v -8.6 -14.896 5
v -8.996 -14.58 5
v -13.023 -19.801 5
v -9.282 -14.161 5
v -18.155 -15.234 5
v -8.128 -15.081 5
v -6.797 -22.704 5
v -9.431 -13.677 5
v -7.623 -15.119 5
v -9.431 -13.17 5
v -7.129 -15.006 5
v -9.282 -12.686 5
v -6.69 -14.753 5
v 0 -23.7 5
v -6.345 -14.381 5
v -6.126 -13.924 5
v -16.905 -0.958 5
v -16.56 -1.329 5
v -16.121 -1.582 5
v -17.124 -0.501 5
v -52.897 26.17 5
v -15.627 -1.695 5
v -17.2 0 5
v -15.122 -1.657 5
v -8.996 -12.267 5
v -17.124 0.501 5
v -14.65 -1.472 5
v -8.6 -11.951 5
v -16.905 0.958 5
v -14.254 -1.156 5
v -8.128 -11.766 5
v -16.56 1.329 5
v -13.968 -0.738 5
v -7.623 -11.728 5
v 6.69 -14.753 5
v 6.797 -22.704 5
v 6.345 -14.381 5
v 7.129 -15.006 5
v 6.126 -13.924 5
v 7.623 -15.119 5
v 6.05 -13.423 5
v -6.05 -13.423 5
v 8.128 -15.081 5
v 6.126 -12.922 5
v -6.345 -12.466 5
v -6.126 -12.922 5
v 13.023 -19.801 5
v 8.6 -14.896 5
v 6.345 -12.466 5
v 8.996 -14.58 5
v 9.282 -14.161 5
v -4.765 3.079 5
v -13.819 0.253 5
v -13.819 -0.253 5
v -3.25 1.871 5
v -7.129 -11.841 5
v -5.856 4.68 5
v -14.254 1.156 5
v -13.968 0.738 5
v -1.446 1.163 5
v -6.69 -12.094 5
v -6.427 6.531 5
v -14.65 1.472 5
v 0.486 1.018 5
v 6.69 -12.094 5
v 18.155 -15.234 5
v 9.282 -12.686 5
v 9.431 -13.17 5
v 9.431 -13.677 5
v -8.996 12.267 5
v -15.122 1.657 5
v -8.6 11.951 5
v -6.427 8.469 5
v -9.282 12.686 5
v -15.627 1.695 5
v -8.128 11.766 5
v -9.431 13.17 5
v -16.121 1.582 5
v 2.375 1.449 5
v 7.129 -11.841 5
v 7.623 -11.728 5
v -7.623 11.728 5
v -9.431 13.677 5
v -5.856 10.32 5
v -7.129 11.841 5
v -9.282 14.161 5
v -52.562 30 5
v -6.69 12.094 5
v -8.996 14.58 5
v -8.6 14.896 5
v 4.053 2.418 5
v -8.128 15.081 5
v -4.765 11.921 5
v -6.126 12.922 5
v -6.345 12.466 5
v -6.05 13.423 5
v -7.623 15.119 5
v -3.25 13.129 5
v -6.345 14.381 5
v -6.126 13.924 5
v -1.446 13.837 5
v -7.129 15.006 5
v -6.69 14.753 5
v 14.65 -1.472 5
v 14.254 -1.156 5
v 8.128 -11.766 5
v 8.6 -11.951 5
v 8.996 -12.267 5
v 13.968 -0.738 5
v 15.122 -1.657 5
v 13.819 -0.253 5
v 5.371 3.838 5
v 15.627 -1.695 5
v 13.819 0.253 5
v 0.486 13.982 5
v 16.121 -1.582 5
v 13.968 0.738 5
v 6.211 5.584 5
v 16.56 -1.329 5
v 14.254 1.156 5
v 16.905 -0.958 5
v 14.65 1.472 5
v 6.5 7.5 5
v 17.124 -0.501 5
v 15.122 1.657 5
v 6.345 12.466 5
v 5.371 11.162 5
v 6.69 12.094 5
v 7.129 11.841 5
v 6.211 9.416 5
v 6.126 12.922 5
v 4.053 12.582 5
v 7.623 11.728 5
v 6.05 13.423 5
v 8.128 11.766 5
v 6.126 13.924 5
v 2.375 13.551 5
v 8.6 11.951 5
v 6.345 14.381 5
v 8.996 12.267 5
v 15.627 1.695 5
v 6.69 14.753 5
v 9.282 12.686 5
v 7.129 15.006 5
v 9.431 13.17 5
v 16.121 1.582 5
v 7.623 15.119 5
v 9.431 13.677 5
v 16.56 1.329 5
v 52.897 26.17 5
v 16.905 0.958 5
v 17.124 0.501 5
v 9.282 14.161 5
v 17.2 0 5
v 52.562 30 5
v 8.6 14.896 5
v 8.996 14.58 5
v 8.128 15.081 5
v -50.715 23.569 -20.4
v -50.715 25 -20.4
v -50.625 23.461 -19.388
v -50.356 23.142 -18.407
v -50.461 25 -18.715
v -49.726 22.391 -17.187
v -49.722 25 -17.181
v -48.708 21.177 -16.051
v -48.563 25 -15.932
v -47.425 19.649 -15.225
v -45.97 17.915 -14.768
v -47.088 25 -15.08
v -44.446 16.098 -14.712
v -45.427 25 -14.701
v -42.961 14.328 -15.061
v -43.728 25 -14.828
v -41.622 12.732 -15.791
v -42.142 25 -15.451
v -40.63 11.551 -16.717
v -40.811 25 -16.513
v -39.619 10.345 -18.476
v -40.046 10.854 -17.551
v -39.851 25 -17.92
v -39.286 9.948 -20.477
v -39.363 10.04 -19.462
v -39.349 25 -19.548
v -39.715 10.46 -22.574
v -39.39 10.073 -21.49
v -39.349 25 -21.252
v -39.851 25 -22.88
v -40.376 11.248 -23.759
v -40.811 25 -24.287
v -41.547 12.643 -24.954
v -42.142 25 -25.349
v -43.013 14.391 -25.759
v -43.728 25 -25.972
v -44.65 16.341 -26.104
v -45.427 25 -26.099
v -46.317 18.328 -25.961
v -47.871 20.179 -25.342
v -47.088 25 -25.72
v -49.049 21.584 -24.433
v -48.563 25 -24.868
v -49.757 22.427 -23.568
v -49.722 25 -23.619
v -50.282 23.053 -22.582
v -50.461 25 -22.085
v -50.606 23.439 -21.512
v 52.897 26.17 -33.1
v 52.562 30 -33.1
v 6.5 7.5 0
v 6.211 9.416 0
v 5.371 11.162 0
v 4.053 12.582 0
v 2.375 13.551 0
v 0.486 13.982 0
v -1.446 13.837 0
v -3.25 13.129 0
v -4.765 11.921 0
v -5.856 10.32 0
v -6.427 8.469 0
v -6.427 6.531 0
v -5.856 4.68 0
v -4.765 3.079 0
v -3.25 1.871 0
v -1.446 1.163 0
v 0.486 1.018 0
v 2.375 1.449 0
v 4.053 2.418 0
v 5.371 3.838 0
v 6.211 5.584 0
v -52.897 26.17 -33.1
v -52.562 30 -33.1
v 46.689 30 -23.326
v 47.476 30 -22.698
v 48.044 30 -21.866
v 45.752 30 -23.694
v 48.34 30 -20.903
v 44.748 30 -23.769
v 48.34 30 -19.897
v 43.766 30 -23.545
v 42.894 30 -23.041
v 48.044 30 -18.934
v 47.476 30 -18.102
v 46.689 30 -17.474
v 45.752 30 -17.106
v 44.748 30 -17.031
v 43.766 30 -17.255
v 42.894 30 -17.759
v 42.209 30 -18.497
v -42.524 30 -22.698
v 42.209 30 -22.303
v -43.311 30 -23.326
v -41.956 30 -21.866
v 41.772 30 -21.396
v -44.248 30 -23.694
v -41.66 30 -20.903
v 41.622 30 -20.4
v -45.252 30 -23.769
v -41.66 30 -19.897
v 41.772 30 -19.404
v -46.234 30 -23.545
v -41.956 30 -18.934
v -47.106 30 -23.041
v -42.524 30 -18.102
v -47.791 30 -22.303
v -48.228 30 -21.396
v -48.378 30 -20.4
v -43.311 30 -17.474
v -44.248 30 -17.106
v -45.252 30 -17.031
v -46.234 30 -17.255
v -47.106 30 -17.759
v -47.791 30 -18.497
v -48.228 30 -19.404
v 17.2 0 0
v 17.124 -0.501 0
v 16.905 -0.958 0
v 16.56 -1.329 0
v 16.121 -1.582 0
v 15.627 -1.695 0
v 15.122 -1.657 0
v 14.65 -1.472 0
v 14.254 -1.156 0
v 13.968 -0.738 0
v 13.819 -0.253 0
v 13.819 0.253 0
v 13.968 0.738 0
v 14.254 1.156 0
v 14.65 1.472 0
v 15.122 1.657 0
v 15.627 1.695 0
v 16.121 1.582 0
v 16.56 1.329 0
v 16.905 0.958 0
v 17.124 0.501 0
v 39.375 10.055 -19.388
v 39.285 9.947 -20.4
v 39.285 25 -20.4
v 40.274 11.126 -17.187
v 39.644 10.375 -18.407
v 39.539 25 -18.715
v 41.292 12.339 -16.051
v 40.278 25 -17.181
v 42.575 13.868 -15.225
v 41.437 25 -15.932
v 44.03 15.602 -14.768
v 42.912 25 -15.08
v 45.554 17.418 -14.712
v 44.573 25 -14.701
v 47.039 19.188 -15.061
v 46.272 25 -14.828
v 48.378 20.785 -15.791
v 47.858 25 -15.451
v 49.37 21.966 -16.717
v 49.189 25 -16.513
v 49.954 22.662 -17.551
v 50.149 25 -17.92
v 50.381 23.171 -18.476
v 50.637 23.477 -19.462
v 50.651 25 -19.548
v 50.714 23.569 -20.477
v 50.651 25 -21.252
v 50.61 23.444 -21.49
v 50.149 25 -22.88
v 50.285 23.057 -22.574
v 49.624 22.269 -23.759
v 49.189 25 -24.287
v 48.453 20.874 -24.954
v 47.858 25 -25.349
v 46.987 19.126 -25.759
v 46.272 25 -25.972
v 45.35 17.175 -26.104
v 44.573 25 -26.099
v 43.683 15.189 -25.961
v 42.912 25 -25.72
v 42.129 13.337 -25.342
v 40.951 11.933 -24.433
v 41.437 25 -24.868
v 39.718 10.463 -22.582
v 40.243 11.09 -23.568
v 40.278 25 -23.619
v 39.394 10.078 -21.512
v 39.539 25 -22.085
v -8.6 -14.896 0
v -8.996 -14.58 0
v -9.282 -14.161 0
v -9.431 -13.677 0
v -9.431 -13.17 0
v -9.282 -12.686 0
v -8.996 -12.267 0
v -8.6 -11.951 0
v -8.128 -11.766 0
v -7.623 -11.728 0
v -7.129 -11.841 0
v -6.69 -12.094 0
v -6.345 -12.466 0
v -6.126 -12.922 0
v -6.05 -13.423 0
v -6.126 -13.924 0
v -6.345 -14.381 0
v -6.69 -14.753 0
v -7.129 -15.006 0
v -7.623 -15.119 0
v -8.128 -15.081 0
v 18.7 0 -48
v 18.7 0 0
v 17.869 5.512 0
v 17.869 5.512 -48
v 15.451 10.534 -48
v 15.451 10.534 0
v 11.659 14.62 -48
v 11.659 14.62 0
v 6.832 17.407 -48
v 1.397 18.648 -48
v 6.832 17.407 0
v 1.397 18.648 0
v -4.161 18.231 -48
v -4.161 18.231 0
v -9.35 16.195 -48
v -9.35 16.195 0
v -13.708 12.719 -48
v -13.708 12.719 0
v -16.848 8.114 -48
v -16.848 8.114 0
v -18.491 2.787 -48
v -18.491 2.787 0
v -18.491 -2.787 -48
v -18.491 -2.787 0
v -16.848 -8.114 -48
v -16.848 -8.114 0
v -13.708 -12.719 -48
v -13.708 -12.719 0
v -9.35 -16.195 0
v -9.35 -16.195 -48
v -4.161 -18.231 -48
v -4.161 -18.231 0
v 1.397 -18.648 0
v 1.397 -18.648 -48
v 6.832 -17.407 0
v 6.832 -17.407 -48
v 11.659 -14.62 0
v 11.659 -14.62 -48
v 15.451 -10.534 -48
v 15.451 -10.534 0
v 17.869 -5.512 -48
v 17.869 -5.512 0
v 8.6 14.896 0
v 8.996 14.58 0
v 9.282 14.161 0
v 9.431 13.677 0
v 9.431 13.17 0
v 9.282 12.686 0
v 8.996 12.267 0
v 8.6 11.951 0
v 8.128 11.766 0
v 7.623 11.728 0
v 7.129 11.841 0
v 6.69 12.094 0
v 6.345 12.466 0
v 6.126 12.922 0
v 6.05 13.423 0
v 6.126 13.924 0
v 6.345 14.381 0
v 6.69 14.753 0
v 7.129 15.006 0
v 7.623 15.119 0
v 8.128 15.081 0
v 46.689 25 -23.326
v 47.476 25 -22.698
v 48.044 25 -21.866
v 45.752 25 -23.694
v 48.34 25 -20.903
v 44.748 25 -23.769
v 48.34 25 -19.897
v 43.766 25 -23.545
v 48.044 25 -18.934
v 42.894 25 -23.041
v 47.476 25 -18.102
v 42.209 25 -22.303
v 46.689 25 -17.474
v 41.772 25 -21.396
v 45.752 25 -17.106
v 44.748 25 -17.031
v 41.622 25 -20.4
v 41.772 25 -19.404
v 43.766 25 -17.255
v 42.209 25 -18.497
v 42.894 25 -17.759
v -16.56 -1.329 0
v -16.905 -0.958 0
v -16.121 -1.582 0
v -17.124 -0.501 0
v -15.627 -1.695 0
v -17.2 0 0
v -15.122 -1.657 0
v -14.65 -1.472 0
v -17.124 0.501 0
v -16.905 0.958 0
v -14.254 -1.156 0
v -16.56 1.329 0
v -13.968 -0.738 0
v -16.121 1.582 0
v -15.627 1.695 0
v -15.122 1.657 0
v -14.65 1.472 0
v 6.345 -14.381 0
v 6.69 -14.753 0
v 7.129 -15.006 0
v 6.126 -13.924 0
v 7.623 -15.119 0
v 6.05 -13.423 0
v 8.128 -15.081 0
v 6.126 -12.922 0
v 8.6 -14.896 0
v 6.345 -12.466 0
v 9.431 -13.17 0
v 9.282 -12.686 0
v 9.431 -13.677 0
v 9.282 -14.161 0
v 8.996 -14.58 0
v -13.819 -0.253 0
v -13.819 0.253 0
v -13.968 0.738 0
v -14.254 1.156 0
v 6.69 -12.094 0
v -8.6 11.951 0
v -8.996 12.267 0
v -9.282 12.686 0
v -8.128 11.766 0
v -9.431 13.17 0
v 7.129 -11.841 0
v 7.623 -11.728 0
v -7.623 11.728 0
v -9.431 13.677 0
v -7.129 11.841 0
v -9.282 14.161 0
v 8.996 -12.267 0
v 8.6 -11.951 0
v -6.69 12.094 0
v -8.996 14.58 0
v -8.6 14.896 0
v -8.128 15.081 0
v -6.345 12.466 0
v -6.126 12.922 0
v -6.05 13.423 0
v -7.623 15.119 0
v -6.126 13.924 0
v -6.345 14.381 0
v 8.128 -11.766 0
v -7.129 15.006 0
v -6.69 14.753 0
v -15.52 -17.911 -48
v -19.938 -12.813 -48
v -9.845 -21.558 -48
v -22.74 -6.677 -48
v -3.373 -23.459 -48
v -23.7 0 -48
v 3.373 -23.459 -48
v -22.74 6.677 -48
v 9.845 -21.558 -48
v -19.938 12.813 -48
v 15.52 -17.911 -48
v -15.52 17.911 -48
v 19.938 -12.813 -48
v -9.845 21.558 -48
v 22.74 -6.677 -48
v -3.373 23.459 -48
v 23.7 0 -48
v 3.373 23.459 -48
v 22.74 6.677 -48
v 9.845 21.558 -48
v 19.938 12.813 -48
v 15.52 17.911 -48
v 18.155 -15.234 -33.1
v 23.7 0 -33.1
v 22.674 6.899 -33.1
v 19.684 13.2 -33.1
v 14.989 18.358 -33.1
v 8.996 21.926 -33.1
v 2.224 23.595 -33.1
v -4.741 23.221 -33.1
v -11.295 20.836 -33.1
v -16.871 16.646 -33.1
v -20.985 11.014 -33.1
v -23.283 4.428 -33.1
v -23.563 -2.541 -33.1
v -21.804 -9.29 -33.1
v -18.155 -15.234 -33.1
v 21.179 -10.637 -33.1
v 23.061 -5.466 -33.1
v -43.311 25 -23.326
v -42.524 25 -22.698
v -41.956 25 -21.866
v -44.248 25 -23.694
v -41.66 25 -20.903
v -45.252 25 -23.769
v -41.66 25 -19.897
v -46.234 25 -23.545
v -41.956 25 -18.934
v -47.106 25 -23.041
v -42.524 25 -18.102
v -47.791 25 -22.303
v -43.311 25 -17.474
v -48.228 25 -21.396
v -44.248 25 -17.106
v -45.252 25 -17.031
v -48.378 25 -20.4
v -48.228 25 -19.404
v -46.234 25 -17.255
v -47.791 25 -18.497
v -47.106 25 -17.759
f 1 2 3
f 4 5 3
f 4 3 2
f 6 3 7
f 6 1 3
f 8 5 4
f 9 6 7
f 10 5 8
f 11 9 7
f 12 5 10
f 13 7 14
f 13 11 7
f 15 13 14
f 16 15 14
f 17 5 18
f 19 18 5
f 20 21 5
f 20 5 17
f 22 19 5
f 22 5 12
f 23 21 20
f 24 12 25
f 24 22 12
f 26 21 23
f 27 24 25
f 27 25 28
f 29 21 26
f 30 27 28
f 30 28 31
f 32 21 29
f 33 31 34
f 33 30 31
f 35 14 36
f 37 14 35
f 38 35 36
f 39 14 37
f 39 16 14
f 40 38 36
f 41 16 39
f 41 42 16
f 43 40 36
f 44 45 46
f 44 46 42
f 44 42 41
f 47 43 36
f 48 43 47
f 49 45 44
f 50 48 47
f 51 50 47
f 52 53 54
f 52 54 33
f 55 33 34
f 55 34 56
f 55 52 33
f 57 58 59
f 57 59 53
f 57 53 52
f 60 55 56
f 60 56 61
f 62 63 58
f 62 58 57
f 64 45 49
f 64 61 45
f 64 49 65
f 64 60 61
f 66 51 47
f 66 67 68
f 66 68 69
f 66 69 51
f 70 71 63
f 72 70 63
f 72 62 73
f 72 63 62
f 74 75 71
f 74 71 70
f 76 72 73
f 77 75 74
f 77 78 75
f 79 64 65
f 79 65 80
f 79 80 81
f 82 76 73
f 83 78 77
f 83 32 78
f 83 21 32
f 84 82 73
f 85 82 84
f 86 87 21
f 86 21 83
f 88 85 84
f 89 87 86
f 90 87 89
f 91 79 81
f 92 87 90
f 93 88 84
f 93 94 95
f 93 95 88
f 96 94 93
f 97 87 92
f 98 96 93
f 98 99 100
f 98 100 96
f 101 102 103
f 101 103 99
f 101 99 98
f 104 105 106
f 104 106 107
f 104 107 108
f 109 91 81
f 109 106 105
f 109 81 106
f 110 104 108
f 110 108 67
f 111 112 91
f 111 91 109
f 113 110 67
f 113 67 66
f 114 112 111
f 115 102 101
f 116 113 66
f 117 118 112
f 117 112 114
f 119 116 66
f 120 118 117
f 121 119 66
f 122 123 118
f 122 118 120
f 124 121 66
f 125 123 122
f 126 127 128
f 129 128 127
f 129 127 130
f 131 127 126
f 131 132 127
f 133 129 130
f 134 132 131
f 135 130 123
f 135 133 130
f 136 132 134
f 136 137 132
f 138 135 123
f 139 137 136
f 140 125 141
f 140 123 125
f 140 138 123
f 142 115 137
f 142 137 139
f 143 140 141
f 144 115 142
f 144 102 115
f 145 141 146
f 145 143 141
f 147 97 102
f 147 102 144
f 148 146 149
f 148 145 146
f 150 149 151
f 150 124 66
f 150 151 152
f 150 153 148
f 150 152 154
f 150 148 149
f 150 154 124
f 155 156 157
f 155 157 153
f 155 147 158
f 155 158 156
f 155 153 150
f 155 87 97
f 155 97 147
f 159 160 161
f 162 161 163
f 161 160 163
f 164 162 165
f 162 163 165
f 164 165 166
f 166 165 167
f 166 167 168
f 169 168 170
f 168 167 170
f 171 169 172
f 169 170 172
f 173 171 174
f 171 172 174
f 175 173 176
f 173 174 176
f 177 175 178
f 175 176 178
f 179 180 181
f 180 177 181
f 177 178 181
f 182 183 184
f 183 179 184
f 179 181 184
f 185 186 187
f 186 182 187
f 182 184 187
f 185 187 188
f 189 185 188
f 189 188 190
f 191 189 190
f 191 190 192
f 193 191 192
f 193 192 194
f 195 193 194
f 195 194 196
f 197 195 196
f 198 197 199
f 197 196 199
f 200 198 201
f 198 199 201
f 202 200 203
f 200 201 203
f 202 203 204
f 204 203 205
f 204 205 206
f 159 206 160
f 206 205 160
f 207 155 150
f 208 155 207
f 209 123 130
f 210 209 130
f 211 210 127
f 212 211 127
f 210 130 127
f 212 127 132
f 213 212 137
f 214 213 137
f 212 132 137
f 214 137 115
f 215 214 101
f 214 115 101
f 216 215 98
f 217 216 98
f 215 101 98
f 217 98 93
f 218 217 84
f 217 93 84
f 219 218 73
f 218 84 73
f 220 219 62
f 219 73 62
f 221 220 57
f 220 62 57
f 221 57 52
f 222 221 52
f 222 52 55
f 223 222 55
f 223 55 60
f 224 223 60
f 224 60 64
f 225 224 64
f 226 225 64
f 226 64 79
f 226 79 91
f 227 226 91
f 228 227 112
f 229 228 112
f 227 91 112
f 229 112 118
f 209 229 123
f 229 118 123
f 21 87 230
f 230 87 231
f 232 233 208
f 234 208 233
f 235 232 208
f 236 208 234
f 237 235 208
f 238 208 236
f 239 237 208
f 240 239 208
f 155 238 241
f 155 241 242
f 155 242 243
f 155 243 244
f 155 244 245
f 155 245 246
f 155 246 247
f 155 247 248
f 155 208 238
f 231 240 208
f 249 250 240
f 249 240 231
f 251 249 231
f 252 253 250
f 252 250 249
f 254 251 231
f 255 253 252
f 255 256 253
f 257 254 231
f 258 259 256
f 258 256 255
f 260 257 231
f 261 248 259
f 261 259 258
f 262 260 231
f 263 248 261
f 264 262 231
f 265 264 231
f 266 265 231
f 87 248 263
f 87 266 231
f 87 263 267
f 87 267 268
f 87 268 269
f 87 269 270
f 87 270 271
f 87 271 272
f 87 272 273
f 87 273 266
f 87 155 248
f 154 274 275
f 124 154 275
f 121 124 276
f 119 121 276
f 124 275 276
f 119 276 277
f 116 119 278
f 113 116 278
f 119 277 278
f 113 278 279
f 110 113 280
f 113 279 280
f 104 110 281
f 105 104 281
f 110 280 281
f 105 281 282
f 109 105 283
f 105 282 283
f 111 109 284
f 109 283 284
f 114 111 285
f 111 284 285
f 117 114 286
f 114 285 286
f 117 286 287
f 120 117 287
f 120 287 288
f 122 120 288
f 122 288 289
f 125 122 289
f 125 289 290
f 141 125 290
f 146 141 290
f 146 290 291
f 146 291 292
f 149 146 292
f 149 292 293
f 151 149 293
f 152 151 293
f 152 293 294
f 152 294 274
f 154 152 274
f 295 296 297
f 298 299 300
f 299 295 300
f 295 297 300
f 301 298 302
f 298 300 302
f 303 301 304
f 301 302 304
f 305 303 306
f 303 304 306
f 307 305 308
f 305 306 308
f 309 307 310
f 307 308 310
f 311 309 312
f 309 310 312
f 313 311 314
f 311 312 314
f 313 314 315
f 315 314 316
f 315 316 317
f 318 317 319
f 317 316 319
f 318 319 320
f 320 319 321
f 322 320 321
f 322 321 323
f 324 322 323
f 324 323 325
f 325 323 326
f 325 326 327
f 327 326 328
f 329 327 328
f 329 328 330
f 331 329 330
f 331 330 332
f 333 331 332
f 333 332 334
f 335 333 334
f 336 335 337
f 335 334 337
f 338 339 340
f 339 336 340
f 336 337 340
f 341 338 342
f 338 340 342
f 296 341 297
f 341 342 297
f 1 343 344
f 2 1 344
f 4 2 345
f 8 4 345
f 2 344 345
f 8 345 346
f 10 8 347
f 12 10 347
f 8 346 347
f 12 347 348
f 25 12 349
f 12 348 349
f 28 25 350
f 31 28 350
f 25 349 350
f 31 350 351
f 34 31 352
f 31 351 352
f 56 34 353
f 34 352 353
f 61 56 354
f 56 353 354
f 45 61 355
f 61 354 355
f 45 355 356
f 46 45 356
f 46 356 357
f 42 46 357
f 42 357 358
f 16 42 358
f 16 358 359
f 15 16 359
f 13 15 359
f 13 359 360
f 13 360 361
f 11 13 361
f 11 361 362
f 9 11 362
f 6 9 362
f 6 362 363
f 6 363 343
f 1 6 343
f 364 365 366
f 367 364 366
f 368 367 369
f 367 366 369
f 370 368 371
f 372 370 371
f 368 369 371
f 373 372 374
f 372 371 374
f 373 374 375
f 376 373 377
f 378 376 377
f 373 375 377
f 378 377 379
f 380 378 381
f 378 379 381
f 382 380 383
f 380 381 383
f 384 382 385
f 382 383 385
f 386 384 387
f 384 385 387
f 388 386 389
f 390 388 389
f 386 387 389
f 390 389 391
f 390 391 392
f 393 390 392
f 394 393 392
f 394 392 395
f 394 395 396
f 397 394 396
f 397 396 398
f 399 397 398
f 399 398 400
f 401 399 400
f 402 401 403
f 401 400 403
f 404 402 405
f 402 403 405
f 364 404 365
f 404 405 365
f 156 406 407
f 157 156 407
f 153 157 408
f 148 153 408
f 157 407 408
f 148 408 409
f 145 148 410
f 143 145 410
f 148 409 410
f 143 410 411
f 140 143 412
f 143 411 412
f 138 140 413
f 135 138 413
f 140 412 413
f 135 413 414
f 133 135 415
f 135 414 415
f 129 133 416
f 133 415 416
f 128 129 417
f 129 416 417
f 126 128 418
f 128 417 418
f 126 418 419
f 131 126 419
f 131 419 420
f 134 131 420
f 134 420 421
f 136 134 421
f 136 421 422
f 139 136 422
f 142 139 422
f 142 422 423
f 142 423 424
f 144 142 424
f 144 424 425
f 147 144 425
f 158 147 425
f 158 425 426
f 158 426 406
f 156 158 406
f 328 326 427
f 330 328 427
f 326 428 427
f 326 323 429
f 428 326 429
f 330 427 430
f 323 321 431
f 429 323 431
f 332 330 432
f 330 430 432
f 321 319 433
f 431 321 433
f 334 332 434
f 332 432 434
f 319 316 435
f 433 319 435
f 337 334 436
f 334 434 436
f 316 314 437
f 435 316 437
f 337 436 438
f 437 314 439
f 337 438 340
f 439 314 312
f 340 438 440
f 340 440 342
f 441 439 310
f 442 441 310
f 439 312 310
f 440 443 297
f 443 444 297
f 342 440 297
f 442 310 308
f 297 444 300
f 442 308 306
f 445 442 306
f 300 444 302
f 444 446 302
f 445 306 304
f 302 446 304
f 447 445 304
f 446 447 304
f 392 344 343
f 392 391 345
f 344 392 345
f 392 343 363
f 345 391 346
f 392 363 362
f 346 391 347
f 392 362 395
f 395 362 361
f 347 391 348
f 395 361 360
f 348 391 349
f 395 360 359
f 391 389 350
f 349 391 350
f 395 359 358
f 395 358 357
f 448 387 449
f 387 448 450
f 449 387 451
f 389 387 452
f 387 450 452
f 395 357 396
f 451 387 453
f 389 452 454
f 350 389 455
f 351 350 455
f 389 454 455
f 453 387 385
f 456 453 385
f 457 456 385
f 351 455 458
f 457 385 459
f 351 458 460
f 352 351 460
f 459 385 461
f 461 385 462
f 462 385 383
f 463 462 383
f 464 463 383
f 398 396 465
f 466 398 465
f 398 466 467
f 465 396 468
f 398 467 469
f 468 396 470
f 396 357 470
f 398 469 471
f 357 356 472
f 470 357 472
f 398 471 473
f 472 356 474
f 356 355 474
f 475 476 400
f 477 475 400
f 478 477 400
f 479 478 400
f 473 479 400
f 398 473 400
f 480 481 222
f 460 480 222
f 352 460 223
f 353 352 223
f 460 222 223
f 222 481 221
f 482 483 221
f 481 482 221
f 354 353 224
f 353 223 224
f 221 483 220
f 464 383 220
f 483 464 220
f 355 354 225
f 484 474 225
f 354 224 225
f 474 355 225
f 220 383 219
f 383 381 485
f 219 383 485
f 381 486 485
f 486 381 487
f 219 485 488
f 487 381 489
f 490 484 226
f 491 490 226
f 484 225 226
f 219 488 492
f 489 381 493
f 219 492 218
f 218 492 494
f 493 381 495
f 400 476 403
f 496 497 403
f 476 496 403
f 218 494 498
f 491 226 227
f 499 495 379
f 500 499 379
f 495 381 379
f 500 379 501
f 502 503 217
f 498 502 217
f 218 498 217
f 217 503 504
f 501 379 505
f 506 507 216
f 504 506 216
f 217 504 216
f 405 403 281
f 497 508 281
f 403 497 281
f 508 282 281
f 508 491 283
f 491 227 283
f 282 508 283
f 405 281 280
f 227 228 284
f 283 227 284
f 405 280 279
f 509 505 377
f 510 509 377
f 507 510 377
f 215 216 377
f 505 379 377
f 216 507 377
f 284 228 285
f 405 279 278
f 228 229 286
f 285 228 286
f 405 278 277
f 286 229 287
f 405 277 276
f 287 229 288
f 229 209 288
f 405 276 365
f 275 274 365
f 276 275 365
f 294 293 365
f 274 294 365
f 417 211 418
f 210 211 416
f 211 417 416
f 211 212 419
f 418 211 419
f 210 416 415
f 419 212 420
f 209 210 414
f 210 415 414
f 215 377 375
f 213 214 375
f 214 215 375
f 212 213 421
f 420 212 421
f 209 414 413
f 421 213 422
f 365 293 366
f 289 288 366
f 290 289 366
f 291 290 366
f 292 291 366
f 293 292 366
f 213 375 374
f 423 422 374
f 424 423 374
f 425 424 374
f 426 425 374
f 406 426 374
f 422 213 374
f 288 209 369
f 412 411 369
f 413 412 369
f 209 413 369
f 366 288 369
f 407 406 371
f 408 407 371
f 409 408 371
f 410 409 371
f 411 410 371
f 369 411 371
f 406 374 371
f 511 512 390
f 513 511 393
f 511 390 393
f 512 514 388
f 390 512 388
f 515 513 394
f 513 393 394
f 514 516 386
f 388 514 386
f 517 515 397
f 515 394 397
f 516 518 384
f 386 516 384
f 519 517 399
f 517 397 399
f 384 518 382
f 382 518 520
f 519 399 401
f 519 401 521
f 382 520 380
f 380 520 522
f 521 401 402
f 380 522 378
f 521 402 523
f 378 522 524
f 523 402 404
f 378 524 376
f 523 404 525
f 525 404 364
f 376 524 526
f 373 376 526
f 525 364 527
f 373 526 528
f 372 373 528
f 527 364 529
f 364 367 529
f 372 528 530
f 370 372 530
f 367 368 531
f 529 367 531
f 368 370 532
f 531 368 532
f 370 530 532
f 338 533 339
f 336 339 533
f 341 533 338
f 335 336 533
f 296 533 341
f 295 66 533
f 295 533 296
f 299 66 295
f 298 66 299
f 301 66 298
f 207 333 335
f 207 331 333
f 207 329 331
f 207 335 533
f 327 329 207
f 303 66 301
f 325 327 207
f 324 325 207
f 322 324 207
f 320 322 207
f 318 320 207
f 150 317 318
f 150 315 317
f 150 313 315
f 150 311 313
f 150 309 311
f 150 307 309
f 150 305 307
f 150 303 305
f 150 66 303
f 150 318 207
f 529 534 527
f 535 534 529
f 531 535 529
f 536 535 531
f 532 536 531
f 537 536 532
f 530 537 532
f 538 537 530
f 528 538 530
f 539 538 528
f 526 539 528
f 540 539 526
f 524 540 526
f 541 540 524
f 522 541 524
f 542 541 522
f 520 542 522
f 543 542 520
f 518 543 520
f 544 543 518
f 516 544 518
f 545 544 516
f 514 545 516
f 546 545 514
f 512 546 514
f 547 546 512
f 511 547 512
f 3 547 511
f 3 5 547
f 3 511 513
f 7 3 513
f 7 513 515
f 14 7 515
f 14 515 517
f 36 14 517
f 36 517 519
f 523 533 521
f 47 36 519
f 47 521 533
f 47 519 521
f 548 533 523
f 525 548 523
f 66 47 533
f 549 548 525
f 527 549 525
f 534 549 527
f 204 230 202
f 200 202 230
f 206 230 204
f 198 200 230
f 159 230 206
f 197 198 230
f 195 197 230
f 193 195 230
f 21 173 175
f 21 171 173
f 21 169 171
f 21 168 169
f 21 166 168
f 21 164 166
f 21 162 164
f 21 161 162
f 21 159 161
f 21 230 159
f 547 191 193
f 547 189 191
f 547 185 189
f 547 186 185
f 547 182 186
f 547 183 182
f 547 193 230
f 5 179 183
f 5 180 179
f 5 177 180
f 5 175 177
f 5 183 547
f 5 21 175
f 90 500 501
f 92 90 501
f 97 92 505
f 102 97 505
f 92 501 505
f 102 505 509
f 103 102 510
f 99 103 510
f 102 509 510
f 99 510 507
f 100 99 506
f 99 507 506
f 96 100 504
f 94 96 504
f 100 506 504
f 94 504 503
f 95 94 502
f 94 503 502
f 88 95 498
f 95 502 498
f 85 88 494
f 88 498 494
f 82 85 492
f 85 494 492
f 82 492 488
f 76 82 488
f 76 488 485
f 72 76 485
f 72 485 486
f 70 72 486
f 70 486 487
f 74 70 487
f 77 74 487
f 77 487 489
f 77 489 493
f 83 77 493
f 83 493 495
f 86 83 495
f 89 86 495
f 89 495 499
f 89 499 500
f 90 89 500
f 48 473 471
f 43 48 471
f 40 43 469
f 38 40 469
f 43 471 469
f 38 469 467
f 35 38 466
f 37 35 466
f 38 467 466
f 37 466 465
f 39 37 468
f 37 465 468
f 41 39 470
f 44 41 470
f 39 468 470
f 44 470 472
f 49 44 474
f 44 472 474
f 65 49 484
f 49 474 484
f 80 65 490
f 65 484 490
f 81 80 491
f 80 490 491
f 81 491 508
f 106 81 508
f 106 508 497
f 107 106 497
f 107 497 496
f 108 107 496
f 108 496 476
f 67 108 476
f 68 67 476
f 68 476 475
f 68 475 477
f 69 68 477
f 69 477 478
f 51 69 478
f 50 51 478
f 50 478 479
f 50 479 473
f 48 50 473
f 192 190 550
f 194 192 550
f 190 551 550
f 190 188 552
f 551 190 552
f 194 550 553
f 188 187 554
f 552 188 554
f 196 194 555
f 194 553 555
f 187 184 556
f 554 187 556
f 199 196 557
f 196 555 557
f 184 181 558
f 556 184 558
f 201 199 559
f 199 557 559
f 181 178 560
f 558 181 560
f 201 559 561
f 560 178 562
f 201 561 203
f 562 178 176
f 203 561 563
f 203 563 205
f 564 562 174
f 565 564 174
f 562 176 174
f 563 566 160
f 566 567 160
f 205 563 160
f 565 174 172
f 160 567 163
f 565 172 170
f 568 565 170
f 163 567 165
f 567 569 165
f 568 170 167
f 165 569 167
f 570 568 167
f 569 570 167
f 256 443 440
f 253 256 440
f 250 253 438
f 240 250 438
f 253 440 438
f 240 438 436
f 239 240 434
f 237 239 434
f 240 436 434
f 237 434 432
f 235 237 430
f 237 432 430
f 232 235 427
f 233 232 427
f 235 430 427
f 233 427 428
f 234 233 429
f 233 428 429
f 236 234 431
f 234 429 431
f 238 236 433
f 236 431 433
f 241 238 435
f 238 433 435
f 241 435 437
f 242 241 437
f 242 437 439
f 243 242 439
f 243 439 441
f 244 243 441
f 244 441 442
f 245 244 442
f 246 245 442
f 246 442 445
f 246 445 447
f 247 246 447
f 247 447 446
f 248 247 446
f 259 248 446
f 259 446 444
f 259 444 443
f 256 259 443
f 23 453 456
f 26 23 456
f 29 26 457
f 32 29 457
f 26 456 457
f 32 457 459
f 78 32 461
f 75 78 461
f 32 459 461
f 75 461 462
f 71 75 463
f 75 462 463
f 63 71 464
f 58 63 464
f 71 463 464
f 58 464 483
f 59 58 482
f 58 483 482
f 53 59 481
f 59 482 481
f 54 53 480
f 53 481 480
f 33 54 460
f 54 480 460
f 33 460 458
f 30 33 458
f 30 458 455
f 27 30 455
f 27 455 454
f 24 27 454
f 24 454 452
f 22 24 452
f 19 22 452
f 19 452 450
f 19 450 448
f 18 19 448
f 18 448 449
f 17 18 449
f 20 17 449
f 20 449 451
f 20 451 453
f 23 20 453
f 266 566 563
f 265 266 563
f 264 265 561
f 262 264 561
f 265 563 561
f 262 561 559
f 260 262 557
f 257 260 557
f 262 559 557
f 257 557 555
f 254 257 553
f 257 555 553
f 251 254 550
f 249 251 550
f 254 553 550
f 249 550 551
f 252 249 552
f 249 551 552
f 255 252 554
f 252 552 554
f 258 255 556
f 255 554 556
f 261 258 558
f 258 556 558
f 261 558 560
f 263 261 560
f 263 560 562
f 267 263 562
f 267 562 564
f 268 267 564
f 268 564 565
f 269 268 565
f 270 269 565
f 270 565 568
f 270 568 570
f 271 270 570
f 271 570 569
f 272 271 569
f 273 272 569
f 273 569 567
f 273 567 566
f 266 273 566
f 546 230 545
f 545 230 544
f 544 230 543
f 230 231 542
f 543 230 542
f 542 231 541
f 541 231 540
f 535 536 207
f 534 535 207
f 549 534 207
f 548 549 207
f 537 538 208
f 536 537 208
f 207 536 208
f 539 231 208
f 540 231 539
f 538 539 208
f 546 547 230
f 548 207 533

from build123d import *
from OCP.BRepFilletAPI import BRepFilletAPI_MakeChamfer

# Parameters (mm, degrees)
SKETCH1_R               = 23.7
SKETCH1_R_2             = 18.7
BOSS_EXTRUDE1_DEPTH     = 48
BOSS_EXTRUDE2_START     = 5
SKETCH1_3_R             = 23.7
SKETCH1_3_R_2           = 6.5
BOSS_EXTRUDE2_DEPTH     = 5
M3_CLEARANCE_HOLE1_D    = 3.4
CIRPATTERN1_COUNT       = 6
BOSS_EXTRUDE3_DEPTH     = 38.1
F_1_4_CLEARANCE_HOLE1_D = 6.7564
SKETCH9_R               = 5.715
CUT_EXTRUDE1_DEPTH      = 89.454226705
CHAMFER1_SIZE           = 5
CHAMFER1_SIZE2          = 3.549039071


with BuildPart() as part:
    # Sketch1 → Boss-Extrude1 (new body)
    with BuildSketch(Plane.XY):
        Circle(SKETCH1_R)
        Circle(SKETCH1_R_2, mode=Mode.SUBTRACT)
    extrude(amount=-BOSS_EXTRUDE1_DEPTH)

    # Sketch1<3> → Boss-Extrude2 (add)
    with BuildSketch(Plane.XY.offset(BOSS_EXTRUDE2_START)):
        Circle(SKETCH1_3_R)
        with Locations((0, 7.5)):
            Circle(SKETCH1_3_R_2, mode=Mode.SUBTRACT)
    extrude(amount=-BOSS_EXTRUDE2_DEPTH)

    # M3 Clearance Hole1 (through all)
    with Locations(Plane.XY.offset(5)):
        with Locations((-15.5, 0)):
            m3_clearance_hole1 = Hole(M3_CLEARANCE_HOLE1_D / 2)

    # CirPattern1: M3 Clearance Hole1 ×6 about axis
    cirpattern1_axis = Axis((0, 0, -48), (0, 0, 1))
    for i in range(1, CIRPATTERN1_COUNT):
        add(m3_clearance_hole1.rotate(cirpattern1_axis, i * 360 / CIRPATTERN1_COUNT), mode=Mode.SUBTRACT)

    # Sketch5 → Boss-Extrude3 (add)
    with BuildSketch(Plane.XY.offset(5)):
        with BuildLine():
            Line((56.111141692, 30), (-56.111141692, 30))
            Line((-56.111141692, 30), (-18.155253302, -15.23406635))
            ThreePointArc((-18.155253302, -15.23406635), (-8.105877397, 22.270715113), (23.7, 0))
            ThreePointArc((23.7, 0), (22.270715113, -8.105877397), (18.155253302, -15.23406635))
            Line((18.155253302, -15.23406635), (56.111141692, 30))
        make_face()
    extrude(amount=-BOSS_EXTRUDE3_DEPTH)

    # 1/4 Clearance Hole1 (through all)
    with Locations(Plane(origin=(0, 30, 0), x_dir=(1, 0, 0), z_dir=(0, 1, 0))):
        with Locations((-45, 20.4), (45, 20.4)):
            Hole(F_1_4_CLEARANCE_HOLE1_D / 2)

    # Sketch9 → Cut-Extrude1 (cut, through all)
    with BuildSketch(Plane(origin=(0, 25, 0), x_dir=(1, 0, 0), z_dir=(0, 1, 0))):
        with Locations((-45, 20.4)):
            Circle(SKETCH9_R)
        with Locations((45, 20.4)):
            Circle(SKETCH9_R)
    extrude(amount=-CUT_EXTRUDE1_DEPTH, mode=Mode.SUBTRACT)

    # Chamfer1: one chamfer whose edges measure the first distance from different faces: ONE call of the kernel's chamfer builder (chamfer() names one face for all edges)
    chamfer1_edges_1 = [part.edges().sort_by_distance(p)[0] for p in [
        (56.111141692, 30, -14.05),
    ]]
    chamfer1_side_1 = [part.faces().sort_by_distance(p)[0] for p in [
        (36.532384477, 6.666945749, -13.565030067),
    ]]
    chamfer1_edges_2 = [part.edges().sort_by_distance(p)[0] for p in [
        (-56.111141692, 30, -14.05),
    ]]
    chamfer1_side_2 = [part.faces().sort_by_distance(p)[0] for p in [
        (-36.532384477, 6.666945749, -13.565030067),
    ]]
    chamfer1 = BRepFilletAPI_MakeChamfer(part.part.solid().wrapped)
    for e in chamfer1_edges_1:
        chamfer1.Add(CHAMFER1_SIZE, CHAMFER1_SIZE2, e.wrapped, chamfer1_side_1[0].wrapped)  # the first distance lies on this face
    for e in chamfer1_edges_2:
        chamfer1.Add(CHAMFER1_SIZE, CHAMFER1_SIZE2, e.wrapped, chamfer1_side_2[0].wrapped)  # the first distance lies on this face
    add(Compound.cast(chamfer1.Shape()), mode=Mode.REPLACE)


solid = part.part
